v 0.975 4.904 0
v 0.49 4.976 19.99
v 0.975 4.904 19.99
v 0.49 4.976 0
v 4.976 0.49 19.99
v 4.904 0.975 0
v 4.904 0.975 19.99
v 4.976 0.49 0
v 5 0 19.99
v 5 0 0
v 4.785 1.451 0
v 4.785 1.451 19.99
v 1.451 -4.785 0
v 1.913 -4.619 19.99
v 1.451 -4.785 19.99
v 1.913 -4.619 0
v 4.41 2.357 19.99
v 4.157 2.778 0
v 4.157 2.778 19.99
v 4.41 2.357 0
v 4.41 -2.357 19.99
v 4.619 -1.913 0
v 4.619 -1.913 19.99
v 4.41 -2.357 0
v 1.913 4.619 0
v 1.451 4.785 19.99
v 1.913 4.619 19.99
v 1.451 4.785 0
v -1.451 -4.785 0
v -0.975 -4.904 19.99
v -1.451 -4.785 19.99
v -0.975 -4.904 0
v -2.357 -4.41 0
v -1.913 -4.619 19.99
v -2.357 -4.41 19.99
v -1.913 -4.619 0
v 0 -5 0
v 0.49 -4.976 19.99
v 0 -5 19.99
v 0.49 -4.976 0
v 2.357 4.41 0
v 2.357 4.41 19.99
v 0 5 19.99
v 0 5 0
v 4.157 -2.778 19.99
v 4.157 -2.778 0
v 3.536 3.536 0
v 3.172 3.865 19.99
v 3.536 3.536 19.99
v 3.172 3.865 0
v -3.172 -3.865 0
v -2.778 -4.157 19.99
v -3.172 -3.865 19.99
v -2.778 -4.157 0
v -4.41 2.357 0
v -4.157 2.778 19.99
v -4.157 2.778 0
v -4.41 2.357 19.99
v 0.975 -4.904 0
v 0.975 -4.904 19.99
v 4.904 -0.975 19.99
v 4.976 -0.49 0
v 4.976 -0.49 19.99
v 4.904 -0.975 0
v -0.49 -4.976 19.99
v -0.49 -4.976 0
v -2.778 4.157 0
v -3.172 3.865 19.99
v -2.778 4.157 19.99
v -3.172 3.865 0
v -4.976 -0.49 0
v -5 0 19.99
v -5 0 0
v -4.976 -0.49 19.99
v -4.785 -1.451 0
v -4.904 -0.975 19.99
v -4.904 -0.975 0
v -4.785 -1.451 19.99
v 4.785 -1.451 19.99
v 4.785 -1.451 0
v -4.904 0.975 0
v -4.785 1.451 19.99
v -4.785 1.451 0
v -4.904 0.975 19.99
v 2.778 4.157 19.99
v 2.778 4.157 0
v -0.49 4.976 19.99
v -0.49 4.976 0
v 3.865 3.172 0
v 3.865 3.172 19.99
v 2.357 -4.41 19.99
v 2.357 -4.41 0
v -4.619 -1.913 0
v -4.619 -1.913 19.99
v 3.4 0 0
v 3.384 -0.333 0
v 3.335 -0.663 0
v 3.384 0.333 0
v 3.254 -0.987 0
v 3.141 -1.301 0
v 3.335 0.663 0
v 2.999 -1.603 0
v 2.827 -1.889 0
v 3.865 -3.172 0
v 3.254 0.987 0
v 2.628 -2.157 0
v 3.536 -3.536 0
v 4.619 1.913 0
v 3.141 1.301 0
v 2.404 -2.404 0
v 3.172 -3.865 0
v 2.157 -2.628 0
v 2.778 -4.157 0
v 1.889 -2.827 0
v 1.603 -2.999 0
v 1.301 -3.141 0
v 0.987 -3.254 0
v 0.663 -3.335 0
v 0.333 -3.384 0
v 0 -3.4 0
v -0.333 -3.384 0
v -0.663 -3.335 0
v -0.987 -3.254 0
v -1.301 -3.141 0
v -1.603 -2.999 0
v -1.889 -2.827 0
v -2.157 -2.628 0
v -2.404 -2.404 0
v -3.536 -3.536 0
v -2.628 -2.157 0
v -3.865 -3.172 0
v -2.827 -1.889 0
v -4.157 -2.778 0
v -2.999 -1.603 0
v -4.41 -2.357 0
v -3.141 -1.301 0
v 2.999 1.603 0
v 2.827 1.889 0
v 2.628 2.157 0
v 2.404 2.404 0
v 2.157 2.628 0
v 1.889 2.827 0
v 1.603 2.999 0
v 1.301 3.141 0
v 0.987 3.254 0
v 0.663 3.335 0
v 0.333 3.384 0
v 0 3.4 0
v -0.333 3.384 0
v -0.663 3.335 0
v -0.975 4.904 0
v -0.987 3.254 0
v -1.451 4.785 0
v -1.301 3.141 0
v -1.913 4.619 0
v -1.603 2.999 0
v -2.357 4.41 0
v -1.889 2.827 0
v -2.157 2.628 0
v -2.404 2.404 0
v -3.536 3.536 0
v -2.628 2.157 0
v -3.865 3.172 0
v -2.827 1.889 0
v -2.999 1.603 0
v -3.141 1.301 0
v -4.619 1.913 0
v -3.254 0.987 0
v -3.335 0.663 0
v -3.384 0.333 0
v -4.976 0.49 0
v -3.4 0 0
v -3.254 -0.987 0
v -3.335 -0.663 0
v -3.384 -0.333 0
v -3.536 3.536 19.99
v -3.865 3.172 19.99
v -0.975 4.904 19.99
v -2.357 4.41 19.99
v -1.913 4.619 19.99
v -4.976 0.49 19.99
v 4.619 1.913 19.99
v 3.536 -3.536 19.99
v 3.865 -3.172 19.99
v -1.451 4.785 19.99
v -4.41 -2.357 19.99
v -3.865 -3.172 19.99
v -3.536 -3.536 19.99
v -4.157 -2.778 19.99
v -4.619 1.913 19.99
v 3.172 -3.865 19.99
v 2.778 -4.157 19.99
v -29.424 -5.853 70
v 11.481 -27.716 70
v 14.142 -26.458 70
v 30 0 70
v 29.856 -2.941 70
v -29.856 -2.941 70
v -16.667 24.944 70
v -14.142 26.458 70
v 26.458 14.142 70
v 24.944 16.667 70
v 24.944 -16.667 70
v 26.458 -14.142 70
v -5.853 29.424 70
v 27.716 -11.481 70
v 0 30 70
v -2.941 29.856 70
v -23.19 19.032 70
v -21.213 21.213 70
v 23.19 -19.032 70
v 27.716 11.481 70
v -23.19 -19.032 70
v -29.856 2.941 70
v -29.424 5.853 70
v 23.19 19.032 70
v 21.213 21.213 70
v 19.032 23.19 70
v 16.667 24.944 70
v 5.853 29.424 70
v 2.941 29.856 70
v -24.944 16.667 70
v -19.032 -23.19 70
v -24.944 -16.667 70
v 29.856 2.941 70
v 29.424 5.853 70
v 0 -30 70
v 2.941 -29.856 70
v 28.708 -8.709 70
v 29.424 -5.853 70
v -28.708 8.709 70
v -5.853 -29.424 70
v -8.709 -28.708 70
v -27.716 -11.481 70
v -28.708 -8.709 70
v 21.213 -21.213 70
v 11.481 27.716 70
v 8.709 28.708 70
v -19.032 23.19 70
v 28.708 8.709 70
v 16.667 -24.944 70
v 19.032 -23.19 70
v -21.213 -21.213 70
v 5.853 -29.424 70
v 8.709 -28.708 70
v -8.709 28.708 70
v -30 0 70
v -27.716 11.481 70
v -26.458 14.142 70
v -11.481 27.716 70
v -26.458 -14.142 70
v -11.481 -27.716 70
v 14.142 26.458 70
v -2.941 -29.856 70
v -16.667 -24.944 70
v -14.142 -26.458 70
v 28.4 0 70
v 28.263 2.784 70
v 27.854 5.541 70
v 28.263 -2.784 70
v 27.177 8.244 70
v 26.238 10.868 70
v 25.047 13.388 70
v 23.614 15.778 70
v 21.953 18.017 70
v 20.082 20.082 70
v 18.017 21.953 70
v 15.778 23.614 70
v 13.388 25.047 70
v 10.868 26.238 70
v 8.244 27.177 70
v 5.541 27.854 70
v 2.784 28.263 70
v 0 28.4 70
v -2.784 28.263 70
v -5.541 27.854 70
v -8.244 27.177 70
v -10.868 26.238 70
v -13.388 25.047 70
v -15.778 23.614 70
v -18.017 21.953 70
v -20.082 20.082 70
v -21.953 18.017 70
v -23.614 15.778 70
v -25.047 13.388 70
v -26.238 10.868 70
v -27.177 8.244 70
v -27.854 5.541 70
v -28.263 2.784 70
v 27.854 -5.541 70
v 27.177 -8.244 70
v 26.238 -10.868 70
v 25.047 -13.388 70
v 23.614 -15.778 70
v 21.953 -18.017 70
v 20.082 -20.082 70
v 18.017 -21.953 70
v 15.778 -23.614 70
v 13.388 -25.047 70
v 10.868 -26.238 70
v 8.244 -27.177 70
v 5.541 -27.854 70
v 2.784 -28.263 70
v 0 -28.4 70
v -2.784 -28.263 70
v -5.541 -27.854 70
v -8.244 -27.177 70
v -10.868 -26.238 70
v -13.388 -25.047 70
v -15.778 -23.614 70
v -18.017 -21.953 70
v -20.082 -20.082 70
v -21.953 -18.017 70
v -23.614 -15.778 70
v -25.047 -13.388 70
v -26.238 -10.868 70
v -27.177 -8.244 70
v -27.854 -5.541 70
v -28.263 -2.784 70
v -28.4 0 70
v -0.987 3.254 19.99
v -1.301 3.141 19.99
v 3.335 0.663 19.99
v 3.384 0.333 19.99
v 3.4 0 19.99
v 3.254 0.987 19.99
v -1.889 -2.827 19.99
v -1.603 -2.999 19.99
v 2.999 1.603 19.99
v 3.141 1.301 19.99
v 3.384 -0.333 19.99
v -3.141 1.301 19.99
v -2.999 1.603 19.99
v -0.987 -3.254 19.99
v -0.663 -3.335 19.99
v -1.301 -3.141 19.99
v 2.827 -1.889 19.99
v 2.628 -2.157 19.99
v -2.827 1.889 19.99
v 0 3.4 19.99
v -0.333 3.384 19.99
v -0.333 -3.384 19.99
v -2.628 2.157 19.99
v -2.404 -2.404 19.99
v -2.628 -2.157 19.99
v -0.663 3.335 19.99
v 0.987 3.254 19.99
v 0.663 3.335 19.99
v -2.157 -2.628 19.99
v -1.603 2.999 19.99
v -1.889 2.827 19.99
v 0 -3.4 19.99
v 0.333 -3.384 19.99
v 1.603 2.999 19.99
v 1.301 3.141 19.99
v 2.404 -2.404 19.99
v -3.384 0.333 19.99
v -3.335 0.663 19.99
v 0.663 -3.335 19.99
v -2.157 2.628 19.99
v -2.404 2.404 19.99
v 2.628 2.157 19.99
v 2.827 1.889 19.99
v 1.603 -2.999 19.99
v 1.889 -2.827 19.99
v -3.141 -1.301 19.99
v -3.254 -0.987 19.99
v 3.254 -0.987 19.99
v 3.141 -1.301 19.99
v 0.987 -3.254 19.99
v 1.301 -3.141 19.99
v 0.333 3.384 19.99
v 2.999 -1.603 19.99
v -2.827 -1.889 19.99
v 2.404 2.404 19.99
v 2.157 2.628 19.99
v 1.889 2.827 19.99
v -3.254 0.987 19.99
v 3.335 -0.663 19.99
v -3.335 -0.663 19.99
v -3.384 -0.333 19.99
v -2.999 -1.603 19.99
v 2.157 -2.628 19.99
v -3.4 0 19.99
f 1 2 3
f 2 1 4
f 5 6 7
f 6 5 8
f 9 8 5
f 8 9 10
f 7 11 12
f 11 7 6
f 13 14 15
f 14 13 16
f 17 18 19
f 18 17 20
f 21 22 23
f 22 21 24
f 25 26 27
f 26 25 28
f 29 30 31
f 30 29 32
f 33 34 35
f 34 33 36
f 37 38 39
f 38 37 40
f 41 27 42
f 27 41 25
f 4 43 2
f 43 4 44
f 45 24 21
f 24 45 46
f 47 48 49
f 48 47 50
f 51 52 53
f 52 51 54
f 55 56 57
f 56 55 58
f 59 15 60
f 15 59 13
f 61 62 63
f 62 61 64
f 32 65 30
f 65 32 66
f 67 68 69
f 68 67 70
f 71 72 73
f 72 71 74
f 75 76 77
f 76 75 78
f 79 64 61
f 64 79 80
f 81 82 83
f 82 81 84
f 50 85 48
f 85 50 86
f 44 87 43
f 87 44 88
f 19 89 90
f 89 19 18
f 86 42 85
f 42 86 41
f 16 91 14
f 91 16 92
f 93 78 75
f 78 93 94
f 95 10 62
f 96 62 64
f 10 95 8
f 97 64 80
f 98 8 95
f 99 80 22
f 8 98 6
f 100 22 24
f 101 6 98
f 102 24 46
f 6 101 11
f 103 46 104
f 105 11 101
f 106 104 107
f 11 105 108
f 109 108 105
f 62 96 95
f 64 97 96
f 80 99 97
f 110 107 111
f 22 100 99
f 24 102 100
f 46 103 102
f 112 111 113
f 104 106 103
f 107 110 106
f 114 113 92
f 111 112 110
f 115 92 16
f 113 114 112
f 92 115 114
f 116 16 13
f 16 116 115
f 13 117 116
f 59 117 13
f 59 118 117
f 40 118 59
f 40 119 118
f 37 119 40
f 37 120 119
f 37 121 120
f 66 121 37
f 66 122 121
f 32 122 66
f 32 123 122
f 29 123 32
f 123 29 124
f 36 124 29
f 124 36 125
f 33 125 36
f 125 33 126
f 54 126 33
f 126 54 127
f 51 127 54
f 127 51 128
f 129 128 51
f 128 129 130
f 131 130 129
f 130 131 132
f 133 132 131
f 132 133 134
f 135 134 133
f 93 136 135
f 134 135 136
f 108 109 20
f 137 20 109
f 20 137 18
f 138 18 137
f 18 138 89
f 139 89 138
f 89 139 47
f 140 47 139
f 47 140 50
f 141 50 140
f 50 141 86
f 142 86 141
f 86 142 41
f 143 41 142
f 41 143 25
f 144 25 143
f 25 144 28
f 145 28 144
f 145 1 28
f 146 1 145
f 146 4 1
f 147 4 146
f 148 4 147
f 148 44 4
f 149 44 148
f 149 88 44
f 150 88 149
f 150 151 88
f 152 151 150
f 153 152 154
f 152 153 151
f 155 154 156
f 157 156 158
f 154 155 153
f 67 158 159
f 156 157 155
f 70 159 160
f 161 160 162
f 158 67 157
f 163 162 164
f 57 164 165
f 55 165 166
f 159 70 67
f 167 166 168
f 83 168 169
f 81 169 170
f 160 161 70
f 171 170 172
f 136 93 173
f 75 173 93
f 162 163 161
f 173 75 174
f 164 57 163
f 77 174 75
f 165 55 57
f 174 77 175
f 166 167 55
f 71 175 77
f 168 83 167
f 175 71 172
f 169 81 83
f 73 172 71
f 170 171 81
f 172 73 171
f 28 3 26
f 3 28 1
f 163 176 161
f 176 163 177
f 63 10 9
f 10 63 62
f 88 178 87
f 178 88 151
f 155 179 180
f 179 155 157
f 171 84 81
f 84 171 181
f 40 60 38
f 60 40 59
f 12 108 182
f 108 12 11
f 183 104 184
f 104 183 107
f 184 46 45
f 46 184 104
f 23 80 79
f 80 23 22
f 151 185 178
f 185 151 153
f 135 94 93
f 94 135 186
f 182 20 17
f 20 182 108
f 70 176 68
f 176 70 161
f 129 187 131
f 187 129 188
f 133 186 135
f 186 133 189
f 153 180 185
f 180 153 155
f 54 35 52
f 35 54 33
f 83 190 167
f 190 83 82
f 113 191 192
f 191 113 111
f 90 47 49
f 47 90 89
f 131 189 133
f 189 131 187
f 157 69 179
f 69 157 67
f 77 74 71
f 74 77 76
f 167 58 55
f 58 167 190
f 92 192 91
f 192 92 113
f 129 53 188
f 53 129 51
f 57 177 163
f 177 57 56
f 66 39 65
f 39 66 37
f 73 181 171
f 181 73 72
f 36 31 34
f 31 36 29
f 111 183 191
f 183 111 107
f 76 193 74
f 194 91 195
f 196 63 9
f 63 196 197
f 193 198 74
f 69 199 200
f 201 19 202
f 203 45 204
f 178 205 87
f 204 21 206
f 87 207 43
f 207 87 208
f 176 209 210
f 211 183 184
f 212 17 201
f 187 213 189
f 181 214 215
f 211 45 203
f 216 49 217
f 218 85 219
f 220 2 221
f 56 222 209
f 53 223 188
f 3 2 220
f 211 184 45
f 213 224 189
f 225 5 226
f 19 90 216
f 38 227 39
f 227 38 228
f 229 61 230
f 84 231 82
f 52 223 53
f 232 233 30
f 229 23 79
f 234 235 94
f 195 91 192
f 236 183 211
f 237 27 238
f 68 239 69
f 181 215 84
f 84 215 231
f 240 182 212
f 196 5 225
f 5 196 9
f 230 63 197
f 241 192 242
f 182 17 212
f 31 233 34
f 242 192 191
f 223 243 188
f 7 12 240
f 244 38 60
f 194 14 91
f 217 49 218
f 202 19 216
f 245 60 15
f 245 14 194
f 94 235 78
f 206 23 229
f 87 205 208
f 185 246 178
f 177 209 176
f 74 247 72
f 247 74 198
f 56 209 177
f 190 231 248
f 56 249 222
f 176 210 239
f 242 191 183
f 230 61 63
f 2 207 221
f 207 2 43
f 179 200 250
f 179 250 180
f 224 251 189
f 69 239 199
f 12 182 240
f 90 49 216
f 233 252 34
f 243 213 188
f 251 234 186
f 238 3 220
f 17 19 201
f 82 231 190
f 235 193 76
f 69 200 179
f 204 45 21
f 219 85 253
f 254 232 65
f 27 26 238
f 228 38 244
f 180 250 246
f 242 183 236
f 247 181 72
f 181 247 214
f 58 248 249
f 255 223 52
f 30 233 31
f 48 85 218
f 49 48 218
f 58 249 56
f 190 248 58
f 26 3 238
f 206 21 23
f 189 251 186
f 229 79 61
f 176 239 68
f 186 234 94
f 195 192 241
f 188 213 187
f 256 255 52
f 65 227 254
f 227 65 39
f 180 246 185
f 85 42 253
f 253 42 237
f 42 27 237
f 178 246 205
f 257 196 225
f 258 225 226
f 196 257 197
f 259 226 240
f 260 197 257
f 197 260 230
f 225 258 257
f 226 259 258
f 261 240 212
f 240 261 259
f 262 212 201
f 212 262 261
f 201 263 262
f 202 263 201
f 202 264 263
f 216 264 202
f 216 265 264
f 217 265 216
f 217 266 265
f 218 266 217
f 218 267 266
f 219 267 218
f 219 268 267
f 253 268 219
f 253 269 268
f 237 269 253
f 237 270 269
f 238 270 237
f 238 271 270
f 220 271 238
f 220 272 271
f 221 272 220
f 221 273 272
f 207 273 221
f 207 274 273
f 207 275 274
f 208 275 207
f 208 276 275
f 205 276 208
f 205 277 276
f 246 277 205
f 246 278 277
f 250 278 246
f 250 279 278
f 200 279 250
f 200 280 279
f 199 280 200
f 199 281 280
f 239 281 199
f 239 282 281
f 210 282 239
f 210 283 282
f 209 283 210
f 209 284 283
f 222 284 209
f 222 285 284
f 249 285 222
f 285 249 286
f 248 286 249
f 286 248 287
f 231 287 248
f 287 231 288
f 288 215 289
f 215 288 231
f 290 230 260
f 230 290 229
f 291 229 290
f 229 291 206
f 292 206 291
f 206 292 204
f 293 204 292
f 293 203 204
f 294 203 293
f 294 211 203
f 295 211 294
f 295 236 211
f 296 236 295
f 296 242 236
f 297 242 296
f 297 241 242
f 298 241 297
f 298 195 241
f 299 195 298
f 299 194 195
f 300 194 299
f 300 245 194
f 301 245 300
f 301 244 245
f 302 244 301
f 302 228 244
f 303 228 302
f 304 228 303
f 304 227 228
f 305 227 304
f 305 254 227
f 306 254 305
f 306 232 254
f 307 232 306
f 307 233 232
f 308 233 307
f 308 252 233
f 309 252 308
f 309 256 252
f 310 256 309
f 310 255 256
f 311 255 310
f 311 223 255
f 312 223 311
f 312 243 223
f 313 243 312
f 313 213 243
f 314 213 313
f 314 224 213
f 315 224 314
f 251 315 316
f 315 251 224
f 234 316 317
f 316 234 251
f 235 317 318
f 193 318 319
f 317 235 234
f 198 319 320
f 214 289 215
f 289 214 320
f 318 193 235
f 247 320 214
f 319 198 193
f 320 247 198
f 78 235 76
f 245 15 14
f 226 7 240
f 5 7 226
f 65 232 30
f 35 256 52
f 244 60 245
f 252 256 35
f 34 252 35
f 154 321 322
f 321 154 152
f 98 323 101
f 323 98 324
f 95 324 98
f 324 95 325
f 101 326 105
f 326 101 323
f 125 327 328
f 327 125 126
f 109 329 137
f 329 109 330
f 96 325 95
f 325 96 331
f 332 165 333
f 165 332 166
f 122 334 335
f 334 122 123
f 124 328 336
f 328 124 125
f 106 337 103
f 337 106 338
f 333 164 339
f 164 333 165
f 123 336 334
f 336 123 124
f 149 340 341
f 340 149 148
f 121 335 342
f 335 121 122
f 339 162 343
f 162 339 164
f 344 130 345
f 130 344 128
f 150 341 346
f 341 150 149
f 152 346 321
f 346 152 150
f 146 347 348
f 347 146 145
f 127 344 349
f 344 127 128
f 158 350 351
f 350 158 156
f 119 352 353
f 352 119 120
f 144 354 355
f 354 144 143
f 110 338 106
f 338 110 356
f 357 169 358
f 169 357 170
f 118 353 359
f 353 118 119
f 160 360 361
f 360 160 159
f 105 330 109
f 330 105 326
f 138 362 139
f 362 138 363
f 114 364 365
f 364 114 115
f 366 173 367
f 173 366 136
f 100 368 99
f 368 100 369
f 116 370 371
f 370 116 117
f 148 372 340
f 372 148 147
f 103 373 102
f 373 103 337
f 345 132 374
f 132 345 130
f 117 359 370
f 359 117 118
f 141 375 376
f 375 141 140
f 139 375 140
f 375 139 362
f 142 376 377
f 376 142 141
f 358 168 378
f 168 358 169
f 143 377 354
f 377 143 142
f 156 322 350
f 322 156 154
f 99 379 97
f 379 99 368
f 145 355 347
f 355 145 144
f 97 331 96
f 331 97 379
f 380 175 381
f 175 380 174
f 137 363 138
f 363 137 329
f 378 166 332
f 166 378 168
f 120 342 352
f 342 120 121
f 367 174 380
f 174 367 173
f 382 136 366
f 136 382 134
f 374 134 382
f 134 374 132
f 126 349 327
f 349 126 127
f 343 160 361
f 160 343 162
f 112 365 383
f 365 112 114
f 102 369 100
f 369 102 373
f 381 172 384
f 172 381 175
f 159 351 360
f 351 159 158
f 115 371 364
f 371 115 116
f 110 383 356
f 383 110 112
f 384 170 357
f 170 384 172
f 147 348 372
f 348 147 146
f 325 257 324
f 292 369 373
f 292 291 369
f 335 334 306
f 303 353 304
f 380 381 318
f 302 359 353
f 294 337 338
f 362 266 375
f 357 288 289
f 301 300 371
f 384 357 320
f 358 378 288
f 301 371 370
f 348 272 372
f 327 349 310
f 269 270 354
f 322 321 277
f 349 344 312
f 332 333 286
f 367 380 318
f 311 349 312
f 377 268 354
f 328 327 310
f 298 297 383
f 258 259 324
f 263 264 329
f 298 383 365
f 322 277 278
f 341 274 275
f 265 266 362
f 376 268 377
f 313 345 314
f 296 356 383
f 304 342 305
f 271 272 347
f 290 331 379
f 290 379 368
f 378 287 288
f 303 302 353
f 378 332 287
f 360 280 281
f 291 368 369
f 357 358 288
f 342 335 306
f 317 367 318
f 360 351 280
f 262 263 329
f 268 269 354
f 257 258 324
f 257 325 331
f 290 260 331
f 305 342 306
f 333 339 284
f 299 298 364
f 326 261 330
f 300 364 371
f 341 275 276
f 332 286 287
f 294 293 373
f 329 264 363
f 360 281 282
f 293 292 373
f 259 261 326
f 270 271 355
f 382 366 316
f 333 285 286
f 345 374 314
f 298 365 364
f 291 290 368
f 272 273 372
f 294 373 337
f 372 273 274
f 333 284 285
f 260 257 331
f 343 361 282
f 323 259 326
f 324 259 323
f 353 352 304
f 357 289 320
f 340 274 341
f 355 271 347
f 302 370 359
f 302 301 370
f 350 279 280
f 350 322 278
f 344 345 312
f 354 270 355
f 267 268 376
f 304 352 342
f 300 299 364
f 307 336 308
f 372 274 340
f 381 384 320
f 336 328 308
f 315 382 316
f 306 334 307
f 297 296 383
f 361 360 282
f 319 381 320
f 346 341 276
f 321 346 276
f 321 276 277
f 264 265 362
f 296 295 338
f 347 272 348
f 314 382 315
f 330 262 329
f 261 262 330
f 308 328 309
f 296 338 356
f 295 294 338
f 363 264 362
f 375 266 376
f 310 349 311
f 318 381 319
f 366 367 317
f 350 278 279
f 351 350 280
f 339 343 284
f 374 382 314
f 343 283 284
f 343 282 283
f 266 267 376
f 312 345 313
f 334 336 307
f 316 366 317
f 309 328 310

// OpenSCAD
// Lab funnel - printed upright, open top and bottom
// Units: mm

$fn = 64;

// --- Dimensions ---
spout_od      = 10;   // spout outer diameter
spout_id      = spout_od - 2 * 1.6;  // spout bore (6.8)
spout_h       = 20;   // spout height (z = 0 to 20)
cone_top_d    = 10;   // cone diameter at spout junction (z = 20)
cone_rim_d    = 60;   // cone rim diameter (z = 50)
cone_h        = cone_rim_d - cone_top_d;  // cone height (40)
wall          = 1.6;  // wall thickness everywhere
eps           = 0.5;  // overshoot for clean cuts

difference() {
    union() {
        // Spout
        cylinder(d = spout_od, h = spout_h);
        // Cone (slightly overlapping the spout for a solid union)
        translate([0, 0, spout_h - 0.01])
            cylinder(d1 = cone_top_d, d2 = cone_rim_d, h = cone_h + 0.01);
    }
    // Through-bore: spout bore up to the cone, then cone wall thickness to rim
    translate([0, 0, -eps])
        cylinder(d = spout_id, h = spout_h + 2 * eps);
    // Cone bore (expands with the wall thickness)
    translate([0, 0, spout_h - 0.01])
        cylinder(d1 = cone_top_d - 2 * wall, d2 = cone_rim_d - 2 * wall, h = cone_h + 0.01);
}
